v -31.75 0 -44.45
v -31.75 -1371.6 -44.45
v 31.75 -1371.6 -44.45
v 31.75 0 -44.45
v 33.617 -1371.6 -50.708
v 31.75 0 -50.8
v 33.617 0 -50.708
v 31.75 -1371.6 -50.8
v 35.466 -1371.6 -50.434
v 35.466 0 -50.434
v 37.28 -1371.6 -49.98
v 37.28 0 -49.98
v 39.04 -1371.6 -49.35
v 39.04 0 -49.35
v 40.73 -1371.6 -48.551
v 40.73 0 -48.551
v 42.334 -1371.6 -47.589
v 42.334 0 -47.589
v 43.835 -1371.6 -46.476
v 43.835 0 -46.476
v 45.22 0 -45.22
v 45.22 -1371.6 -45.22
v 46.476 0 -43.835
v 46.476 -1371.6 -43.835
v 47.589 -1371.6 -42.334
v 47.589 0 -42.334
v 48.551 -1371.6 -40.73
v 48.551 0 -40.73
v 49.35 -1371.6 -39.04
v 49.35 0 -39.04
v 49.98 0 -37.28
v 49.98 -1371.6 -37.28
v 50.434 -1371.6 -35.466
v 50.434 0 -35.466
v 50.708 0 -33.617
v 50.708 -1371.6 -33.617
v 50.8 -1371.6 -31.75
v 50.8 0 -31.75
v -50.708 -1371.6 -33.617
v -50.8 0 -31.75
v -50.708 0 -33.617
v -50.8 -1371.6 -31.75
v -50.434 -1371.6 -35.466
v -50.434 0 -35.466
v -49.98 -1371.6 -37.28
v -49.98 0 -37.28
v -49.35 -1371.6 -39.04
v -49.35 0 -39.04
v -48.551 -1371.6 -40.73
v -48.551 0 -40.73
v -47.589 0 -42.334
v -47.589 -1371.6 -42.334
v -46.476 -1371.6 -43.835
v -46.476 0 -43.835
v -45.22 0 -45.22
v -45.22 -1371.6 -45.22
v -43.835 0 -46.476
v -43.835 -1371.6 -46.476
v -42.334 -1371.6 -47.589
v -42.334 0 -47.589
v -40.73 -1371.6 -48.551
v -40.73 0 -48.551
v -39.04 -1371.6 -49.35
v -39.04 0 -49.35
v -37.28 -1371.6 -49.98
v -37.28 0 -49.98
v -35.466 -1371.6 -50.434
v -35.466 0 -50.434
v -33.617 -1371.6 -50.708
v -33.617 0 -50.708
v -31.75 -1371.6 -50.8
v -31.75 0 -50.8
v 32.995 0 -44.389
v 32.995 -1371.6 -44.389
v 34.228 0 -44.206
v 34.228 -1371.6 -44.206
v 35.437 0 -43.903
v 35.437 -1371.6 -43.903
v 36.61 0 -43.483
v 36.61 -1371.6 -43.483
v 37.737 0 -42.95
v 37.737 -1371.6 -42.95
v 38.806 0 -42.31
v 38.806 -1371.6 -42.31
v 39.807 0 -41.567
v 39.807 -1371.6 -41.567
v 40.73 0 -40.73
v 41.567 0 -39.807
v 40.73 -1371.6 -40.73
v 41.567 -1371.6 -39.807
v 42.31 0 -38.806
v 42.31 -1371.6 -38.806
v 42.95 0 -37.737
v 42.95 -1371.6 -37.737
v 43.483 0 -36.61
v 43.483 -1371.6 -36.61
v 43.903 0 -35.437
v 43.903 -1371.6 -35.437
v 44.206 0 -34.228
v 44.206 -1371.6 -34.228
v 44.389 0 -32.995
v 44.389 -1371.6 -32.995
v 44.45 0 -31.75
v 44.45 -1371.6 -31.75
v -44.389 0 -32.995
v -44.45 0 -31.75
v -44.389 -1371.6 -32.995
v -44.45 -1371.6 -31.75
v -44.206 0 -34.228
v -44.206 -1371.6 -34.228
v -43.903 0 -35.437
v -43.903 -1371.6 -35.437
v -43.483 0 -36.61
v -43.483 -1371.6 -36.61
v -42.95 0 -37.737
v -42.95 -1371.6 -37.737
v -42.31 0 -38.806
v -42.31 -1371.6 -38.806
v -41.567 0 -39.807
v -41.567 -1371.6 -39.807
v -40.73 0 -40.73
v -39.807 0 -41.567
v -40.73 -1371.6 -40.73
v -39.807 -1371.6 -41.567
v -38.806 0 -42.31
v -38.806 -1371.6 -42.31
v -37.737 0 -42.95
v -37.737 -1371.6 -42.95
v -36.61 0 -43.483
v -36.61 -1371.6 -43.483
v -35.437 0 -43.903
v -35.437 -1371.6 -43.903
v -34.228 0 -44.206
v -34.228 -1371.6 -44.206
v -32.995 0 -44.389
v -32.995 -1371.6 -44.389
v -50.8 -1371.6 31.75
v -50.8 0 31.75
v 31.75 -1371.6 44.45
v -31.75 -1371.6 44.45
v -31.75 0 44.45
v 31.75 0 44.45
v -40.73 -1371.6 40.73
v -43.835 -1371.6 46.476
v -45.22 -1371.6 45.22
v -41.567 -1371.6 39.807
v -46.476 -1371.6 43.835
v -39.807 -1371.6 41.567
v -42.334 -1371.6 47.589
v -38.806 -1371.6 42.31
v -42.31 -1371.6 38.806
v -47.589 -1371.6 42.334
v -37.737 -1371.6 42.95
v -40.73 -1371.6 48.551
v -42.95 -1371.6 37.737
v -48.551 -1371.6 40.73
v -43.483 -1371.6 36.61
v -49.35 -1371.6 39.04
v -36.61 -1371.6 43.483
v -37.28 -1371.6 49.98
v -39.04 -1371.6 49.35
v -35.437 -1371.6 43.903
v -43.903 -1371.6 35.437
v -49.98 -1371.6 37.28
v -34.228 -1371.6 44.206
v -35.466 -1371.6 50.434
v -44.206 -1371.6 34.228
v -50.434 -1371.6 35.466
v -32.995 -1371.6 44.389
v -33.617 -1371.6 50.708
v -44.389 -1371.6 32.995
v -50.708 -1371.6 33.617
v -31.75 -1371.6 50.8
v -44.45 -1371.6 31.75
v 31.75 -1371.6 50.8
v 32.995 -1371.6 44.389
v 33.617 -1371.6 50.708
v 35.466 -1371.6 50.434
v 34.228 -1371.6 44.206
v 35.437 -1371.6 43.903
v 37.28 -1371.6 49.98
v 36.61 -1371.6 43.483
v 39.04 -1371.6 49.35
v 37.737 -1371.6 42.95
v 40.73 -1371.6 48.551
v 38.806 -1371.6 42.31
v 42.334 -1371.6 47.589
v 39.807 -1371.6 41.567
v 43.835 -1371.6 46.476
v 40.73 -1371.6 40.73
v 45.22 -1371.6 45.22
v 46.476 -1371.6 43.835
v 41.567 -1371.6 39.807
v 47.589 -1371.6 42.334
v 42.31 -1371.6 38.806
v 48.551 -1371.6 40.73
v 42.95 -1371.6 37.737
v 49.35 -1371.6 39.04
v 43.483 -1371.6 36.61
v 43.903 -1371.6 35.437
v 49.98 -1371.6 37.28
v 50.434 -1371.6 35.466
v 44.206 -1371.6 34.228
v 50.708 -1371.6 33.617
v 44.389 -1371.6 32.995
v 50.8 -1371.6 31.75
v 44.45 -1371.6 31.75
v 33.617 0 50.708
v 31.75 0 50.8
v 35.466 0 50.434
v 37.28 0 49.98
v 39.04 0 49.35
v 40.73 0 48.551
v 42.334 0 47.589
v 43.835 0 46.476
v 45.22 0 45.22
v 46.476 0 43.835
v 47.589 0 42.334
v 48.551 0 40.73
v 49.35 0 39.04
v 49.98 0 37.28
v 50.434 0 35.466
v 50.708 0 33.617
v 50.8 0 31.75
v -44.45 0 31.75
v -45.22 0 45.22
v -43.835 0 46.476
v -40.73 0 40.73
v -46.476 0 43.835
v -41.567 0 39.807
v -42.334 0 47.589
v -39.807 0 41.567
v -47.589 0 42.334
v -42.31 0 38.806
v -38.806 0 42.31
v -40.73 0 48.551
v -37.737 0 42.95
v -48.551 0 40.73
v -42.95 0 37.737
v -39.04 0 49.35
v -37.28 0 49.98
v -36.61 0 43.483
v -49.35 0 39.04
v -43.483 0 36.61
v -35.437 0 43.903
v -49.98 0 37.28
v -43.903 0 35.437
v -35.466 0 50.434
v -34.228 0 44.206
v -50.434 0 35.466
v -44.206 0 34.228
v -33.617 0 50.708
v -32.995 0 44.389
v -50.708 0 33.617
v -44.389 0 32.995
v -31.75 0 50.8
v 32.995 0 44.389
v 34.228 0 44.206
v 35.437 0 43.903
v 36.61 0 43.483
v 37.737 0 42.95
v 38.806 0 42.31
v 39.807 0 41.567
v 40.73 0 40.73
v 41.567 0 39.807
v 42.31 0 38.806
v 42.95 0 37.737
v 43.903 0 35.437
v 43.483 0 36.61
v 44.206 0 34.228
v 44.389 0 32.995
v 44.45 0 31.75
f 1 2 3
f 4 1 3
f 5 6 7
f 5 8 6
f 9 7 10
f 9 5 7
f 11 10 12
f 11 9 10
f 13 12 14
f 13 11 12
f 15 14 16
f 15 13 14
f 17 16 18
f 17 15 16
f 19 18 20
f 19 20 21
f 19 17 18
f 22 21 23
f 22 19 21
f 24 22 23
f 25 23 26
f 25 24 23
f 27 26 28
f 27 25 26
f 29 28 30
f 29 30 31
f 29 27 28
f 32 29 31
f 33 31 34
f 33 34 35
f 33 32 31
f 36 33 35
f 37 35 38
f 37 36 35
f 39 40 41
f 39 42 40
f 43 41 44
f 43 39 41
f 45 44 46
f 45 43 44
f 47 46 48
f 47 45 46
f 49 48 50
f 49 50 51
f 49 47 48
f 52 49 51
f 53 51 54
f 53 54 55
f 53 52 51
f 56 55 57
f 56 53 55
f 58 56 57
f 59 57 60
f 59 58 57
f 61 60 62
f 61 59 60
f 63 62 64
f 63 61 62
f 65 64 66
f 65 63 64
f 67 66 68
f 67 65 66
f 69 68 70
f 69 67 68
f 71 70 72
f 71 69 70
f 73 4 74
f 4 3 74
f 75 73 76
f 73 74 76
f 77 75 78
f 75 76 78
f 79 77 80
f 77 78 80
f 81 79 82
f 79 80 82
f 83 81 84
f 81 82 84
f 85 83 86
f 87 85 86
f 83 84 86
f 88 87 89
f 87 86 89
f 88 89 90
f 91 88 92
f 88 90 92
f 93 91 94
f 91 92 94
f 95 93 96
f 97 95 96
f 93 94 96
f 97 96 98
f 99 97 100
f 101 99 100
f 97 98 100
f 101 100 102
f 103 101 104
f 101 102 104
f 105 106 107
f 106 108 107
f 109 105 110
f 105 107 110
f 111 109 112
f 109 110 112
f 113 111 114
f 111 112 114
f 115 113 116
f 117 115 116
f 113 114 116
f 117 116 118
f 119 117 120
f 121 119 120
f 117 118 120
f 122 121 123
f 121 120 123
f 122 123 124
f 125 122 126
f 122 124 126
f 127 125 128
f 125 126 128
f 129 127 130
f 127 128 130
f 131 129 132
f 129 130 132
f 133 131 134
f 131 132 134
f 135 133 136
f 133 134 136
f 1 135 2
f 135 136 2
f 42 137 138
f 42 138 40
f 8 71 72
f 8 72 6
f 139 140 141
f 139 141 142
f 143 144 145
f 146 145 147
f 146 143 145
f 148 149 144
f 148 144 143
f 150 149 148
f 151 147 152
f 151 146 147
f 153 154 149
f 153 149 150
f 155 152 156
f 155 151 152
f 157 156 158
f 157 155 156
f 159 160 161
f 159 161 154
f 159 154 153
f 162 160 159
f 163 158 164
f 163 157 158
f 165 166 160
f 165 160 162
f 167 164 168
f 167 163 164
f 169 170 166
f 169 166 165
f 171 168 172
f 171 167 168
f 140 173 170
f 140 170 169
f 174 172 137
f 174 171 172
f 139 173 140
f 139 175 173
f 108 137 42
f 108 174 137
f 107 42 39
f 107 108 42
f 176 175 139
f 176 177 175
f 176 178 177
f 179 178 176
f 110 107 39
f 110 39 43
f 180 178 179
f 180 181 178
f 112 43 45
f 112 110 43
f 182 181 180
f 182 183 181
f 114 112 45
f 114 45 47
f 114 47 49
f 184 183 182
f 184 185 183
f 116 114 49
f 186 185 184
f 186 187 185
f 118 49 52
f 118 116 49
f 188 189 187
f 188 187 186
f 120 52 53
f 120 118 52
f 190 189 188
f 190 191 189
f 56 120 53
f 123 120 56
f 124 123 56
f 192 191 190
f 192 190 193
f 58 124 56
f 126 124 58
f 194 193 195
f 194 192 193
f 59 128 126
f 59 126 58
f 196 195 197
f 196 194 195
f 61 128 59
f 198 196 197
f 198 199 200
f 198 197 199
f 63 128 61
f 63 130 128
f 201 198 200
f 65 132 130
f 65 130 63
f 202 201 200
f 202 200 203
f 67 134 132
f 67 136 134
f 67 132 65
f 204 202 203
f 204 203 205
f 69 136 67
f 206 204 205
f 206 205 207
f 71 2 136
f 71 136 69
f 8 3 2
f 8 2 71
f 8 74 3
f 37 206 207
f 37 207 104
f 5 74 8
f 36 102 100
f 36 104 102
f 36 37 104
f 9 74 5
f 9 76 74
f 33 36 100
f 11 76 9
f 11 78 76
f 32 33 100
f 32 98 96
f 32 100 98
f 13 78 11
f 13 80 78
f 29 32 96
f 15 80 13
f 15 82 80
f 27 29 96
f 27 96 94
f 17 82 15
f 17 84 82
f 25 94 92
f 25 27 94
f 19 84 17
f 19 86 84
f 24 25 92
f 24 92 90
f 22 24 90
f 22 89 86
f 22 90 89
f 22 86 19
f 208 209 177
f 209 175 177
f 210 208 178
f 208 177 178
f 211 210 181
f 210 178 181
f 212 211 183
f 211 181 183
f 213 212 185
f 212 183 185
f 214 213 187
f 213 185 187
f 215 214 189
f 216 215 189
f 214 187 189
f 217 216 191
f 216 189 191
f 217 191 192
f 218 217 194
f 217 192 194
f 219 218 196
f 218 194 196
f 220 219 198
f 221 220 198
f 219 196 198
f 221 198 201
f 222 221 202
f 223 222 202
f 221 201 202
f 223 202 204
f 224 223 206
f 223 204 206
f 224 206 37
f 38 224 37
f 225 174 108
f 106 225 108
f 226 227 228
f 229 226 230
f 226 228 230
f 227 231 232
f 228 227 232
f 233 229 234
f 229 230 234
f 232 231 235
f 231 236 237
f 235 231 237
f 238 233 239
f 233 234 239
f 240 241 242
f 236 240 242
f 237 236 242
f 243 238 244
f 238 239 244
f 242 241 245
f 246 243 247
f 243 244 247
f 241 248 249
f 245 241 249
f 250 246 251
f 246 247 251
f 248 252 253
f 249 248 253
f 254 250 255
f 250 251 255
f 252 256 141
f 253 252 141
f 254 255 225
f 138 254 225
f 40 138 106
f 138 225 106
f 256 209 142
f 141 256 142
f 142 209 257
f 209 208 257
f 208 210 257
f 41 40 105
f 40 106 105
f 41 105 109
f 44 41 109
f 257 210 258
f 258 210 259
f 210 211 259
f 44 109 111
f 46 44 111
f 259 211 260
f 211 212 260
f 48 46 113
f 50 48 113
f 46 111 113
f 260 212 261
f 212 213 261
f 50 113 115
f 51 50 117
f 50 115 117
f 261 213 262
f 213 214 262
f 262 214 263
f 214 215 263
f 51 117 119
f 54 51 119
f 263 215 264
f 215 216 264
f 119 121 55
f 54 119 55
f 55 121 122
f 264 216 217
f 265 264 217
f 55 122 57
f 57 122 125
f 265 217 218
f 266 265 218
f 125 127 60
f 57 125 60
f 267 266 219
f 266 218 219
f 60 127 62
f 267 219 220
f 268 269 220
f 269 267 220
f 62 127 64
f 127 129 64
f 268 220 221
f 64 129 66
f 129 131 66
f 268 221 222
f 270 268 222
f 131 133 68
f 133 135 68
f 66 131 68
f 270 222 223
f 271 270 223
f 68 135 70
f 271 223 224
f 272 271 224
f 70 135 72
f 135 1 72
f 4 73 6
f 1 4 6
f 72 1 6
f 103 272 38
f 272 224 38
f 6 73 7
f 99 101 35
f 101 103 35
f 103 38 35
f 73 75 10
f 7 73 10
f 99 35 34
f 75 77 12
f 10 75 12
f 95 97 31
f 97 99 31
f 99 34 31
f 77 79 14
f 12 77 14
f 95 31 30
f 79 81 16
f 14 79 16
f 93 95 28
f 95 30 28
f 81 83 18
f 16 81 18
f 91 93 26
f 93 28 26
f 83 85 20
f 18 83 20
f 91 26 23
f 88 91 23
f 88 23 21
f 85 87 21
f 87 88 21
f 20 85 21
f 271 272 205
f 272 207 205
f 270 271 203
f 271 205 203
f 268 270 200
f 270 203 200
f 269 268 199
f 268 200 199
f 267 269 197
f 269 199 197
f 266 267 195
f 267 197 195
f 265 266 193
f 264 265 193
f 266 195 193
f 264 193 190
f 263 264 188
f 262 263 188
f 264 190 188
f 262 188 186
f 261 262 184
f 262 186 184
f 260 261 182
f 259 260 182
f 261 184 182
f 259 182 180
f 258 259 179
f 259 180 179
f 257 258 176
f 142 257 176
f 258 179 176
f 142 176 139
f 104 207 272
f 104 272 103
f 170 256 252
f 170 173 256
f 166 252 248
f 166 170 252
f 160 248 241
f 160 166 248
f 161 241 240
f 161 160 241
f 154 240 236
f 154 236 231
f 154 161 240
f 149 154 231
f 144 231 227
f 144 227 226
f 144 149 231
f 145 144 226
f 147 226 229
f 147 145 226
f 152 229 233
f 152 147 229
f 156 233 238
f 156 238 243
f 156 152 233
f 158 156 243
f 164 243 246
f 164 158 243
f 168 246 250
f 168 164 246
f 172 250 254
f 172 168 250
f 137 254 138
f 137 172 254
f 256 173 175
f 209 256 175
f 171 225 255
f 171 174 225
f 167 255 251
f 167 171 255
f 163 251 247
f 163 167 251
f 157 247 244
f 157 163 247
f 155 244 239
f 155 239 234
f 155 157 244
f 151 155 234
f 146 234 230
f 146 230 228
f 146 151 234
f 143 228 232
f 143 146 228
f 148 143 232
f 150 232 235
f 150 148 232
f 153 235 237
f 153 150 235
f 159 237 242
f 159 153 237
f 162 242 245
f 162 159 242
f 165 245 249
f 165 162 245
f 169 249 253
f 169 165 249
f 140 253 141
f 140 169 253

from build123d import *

# Parameters (mm, degrees)
SKETCH_W             = 101.6
SKETCH_H             = 101.6
PAD_DEPTH            = 1371.6
FILLET_R             = 19.05
SKETCH001_W          = 88.9
SKETCH001_H          = 88.9
POCKET_DEPTH         = 1371.601
FILLET001_R          = 12.7
BODY_ROLL_ANGLE      = -90
BODY_PLACEMENT_ANGLE = -90


with BuildPart() as part:
    # Sketch → Pad (new body)
    with BuildSketch(Plane.YZ):
        Rectangle(SKETCH_W, SKETCH_H)
    extrude(amount=PAD_DEPTH)

    # Fillet
    fillet_edges = [part.edges().sort_by_distance(p)[0] for p in [
        (685.8, 50.8, 50.8),
        (685.8, -50.8, 50.8),
        (685.8, 50.8, -50.8),
        (685.8, -50.8, -50.8),
    ]]
    fillet(fillet_edges, radius=FILLET_R)

    # Sketch001 → Pocket (cut, through all)
    with BuildSketch(Plane.YZ):
        Rectangle(SKETCH001_W, SKETCH001_H)
    extrude(amount=POCKET_DEPTH, mode=Mode.SUBTRACT)

    # Fillet001
    fillet001_edges = [part.edges().sort_by_distance(p)[0] for p in [
        (685.8, -44.45, -44.45),
        (685.8, -44.45, 44.45),
        (685.8, 44.45, 44.45),
        (685.8, 44.45, -44.45),
    ]]
    fillet(fillet001_edges, radius=FILLET001_R)


with BuildPart() as part_1:
    # Body roll: moved
    add(part.part.rotate(Axis((0, 0, 0), (1, 0, 0)), BODY_ROLL_ANGLE))


with BuildPart() as part_2:
    # Body placement: moved
    add(part_1.part.rotate(Axis((0, 0, 0), (0, 0, 1)), BODY_PLACEMENT_ANGLE))


solid = part_2.part
